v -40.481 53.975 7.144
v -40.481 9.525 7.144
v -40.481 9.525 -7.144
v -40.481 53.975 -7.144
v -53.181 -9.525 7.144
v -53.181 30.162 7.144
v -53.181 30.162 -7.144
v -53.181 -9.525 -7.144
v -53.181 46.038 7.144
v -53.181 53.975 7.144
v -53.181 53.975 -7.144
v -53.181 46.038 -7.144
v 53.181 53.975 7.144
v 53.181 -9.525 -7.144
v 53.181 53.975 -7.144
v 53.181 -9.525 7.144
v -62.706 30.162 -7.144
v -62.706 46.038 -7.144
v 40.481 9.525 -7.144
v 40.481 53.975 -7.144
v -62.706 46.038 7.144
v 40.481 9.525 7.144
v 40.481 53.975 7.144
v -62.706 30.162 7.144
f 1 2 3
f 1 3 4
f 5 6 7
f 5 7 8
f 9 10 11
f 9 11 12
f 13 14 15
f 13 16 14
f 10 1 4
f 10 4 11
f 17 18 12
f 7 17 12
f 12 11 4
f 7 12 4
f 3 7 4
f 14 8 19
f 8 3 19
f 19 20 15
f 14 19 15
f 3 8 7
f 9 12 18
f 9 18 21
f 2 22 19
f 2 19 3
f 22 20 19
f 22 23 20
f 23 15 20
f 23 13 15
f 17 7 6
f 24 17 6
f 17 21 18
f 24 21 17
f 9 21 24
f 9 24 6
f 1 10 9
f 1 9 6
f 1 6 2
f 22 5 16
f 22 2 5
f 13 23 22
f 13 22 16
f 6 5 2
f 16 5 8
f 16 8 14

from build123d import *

# Parameters (mm, degrees)
F1_DEPTH = 7.14375
F2_W     = 15.875
F2_H     = 14.2875
F3_DEPTH = 9.525


with BuildPart() as f1:
    # F0 (on Top) → F1 (new body, symmetric)
    with BuildSketch(Plane.XY):
        Polygon((40.48125, 53.975), (40.48125, 9.525), (-40.48125, 9.525), (-40.48125, 53.975), (-53.18125, 53.975), (-53.18125, 9.525), (-53.18125, -9.525), (-40.48125, -9.525), (40.48125, -9.525), (53.18125, -9.525), (53.18125, 9.525), (53.18125, 53.975), align=None)
    extrude(amount=F1_DEPTH, both=True)

    # F2 (on face) → F3 (join)
    with BuildSketch(Plane(origin=(-53.18125, 0, 0), x_dir=(0, -1, 0), z_dir=(-1, 0, 0))):
        with Locations((-38.1, 0)):
            Rectangle(F2_W, F2_H)
    extrude(amount=F3_DEPTH)


solid = f1.part
